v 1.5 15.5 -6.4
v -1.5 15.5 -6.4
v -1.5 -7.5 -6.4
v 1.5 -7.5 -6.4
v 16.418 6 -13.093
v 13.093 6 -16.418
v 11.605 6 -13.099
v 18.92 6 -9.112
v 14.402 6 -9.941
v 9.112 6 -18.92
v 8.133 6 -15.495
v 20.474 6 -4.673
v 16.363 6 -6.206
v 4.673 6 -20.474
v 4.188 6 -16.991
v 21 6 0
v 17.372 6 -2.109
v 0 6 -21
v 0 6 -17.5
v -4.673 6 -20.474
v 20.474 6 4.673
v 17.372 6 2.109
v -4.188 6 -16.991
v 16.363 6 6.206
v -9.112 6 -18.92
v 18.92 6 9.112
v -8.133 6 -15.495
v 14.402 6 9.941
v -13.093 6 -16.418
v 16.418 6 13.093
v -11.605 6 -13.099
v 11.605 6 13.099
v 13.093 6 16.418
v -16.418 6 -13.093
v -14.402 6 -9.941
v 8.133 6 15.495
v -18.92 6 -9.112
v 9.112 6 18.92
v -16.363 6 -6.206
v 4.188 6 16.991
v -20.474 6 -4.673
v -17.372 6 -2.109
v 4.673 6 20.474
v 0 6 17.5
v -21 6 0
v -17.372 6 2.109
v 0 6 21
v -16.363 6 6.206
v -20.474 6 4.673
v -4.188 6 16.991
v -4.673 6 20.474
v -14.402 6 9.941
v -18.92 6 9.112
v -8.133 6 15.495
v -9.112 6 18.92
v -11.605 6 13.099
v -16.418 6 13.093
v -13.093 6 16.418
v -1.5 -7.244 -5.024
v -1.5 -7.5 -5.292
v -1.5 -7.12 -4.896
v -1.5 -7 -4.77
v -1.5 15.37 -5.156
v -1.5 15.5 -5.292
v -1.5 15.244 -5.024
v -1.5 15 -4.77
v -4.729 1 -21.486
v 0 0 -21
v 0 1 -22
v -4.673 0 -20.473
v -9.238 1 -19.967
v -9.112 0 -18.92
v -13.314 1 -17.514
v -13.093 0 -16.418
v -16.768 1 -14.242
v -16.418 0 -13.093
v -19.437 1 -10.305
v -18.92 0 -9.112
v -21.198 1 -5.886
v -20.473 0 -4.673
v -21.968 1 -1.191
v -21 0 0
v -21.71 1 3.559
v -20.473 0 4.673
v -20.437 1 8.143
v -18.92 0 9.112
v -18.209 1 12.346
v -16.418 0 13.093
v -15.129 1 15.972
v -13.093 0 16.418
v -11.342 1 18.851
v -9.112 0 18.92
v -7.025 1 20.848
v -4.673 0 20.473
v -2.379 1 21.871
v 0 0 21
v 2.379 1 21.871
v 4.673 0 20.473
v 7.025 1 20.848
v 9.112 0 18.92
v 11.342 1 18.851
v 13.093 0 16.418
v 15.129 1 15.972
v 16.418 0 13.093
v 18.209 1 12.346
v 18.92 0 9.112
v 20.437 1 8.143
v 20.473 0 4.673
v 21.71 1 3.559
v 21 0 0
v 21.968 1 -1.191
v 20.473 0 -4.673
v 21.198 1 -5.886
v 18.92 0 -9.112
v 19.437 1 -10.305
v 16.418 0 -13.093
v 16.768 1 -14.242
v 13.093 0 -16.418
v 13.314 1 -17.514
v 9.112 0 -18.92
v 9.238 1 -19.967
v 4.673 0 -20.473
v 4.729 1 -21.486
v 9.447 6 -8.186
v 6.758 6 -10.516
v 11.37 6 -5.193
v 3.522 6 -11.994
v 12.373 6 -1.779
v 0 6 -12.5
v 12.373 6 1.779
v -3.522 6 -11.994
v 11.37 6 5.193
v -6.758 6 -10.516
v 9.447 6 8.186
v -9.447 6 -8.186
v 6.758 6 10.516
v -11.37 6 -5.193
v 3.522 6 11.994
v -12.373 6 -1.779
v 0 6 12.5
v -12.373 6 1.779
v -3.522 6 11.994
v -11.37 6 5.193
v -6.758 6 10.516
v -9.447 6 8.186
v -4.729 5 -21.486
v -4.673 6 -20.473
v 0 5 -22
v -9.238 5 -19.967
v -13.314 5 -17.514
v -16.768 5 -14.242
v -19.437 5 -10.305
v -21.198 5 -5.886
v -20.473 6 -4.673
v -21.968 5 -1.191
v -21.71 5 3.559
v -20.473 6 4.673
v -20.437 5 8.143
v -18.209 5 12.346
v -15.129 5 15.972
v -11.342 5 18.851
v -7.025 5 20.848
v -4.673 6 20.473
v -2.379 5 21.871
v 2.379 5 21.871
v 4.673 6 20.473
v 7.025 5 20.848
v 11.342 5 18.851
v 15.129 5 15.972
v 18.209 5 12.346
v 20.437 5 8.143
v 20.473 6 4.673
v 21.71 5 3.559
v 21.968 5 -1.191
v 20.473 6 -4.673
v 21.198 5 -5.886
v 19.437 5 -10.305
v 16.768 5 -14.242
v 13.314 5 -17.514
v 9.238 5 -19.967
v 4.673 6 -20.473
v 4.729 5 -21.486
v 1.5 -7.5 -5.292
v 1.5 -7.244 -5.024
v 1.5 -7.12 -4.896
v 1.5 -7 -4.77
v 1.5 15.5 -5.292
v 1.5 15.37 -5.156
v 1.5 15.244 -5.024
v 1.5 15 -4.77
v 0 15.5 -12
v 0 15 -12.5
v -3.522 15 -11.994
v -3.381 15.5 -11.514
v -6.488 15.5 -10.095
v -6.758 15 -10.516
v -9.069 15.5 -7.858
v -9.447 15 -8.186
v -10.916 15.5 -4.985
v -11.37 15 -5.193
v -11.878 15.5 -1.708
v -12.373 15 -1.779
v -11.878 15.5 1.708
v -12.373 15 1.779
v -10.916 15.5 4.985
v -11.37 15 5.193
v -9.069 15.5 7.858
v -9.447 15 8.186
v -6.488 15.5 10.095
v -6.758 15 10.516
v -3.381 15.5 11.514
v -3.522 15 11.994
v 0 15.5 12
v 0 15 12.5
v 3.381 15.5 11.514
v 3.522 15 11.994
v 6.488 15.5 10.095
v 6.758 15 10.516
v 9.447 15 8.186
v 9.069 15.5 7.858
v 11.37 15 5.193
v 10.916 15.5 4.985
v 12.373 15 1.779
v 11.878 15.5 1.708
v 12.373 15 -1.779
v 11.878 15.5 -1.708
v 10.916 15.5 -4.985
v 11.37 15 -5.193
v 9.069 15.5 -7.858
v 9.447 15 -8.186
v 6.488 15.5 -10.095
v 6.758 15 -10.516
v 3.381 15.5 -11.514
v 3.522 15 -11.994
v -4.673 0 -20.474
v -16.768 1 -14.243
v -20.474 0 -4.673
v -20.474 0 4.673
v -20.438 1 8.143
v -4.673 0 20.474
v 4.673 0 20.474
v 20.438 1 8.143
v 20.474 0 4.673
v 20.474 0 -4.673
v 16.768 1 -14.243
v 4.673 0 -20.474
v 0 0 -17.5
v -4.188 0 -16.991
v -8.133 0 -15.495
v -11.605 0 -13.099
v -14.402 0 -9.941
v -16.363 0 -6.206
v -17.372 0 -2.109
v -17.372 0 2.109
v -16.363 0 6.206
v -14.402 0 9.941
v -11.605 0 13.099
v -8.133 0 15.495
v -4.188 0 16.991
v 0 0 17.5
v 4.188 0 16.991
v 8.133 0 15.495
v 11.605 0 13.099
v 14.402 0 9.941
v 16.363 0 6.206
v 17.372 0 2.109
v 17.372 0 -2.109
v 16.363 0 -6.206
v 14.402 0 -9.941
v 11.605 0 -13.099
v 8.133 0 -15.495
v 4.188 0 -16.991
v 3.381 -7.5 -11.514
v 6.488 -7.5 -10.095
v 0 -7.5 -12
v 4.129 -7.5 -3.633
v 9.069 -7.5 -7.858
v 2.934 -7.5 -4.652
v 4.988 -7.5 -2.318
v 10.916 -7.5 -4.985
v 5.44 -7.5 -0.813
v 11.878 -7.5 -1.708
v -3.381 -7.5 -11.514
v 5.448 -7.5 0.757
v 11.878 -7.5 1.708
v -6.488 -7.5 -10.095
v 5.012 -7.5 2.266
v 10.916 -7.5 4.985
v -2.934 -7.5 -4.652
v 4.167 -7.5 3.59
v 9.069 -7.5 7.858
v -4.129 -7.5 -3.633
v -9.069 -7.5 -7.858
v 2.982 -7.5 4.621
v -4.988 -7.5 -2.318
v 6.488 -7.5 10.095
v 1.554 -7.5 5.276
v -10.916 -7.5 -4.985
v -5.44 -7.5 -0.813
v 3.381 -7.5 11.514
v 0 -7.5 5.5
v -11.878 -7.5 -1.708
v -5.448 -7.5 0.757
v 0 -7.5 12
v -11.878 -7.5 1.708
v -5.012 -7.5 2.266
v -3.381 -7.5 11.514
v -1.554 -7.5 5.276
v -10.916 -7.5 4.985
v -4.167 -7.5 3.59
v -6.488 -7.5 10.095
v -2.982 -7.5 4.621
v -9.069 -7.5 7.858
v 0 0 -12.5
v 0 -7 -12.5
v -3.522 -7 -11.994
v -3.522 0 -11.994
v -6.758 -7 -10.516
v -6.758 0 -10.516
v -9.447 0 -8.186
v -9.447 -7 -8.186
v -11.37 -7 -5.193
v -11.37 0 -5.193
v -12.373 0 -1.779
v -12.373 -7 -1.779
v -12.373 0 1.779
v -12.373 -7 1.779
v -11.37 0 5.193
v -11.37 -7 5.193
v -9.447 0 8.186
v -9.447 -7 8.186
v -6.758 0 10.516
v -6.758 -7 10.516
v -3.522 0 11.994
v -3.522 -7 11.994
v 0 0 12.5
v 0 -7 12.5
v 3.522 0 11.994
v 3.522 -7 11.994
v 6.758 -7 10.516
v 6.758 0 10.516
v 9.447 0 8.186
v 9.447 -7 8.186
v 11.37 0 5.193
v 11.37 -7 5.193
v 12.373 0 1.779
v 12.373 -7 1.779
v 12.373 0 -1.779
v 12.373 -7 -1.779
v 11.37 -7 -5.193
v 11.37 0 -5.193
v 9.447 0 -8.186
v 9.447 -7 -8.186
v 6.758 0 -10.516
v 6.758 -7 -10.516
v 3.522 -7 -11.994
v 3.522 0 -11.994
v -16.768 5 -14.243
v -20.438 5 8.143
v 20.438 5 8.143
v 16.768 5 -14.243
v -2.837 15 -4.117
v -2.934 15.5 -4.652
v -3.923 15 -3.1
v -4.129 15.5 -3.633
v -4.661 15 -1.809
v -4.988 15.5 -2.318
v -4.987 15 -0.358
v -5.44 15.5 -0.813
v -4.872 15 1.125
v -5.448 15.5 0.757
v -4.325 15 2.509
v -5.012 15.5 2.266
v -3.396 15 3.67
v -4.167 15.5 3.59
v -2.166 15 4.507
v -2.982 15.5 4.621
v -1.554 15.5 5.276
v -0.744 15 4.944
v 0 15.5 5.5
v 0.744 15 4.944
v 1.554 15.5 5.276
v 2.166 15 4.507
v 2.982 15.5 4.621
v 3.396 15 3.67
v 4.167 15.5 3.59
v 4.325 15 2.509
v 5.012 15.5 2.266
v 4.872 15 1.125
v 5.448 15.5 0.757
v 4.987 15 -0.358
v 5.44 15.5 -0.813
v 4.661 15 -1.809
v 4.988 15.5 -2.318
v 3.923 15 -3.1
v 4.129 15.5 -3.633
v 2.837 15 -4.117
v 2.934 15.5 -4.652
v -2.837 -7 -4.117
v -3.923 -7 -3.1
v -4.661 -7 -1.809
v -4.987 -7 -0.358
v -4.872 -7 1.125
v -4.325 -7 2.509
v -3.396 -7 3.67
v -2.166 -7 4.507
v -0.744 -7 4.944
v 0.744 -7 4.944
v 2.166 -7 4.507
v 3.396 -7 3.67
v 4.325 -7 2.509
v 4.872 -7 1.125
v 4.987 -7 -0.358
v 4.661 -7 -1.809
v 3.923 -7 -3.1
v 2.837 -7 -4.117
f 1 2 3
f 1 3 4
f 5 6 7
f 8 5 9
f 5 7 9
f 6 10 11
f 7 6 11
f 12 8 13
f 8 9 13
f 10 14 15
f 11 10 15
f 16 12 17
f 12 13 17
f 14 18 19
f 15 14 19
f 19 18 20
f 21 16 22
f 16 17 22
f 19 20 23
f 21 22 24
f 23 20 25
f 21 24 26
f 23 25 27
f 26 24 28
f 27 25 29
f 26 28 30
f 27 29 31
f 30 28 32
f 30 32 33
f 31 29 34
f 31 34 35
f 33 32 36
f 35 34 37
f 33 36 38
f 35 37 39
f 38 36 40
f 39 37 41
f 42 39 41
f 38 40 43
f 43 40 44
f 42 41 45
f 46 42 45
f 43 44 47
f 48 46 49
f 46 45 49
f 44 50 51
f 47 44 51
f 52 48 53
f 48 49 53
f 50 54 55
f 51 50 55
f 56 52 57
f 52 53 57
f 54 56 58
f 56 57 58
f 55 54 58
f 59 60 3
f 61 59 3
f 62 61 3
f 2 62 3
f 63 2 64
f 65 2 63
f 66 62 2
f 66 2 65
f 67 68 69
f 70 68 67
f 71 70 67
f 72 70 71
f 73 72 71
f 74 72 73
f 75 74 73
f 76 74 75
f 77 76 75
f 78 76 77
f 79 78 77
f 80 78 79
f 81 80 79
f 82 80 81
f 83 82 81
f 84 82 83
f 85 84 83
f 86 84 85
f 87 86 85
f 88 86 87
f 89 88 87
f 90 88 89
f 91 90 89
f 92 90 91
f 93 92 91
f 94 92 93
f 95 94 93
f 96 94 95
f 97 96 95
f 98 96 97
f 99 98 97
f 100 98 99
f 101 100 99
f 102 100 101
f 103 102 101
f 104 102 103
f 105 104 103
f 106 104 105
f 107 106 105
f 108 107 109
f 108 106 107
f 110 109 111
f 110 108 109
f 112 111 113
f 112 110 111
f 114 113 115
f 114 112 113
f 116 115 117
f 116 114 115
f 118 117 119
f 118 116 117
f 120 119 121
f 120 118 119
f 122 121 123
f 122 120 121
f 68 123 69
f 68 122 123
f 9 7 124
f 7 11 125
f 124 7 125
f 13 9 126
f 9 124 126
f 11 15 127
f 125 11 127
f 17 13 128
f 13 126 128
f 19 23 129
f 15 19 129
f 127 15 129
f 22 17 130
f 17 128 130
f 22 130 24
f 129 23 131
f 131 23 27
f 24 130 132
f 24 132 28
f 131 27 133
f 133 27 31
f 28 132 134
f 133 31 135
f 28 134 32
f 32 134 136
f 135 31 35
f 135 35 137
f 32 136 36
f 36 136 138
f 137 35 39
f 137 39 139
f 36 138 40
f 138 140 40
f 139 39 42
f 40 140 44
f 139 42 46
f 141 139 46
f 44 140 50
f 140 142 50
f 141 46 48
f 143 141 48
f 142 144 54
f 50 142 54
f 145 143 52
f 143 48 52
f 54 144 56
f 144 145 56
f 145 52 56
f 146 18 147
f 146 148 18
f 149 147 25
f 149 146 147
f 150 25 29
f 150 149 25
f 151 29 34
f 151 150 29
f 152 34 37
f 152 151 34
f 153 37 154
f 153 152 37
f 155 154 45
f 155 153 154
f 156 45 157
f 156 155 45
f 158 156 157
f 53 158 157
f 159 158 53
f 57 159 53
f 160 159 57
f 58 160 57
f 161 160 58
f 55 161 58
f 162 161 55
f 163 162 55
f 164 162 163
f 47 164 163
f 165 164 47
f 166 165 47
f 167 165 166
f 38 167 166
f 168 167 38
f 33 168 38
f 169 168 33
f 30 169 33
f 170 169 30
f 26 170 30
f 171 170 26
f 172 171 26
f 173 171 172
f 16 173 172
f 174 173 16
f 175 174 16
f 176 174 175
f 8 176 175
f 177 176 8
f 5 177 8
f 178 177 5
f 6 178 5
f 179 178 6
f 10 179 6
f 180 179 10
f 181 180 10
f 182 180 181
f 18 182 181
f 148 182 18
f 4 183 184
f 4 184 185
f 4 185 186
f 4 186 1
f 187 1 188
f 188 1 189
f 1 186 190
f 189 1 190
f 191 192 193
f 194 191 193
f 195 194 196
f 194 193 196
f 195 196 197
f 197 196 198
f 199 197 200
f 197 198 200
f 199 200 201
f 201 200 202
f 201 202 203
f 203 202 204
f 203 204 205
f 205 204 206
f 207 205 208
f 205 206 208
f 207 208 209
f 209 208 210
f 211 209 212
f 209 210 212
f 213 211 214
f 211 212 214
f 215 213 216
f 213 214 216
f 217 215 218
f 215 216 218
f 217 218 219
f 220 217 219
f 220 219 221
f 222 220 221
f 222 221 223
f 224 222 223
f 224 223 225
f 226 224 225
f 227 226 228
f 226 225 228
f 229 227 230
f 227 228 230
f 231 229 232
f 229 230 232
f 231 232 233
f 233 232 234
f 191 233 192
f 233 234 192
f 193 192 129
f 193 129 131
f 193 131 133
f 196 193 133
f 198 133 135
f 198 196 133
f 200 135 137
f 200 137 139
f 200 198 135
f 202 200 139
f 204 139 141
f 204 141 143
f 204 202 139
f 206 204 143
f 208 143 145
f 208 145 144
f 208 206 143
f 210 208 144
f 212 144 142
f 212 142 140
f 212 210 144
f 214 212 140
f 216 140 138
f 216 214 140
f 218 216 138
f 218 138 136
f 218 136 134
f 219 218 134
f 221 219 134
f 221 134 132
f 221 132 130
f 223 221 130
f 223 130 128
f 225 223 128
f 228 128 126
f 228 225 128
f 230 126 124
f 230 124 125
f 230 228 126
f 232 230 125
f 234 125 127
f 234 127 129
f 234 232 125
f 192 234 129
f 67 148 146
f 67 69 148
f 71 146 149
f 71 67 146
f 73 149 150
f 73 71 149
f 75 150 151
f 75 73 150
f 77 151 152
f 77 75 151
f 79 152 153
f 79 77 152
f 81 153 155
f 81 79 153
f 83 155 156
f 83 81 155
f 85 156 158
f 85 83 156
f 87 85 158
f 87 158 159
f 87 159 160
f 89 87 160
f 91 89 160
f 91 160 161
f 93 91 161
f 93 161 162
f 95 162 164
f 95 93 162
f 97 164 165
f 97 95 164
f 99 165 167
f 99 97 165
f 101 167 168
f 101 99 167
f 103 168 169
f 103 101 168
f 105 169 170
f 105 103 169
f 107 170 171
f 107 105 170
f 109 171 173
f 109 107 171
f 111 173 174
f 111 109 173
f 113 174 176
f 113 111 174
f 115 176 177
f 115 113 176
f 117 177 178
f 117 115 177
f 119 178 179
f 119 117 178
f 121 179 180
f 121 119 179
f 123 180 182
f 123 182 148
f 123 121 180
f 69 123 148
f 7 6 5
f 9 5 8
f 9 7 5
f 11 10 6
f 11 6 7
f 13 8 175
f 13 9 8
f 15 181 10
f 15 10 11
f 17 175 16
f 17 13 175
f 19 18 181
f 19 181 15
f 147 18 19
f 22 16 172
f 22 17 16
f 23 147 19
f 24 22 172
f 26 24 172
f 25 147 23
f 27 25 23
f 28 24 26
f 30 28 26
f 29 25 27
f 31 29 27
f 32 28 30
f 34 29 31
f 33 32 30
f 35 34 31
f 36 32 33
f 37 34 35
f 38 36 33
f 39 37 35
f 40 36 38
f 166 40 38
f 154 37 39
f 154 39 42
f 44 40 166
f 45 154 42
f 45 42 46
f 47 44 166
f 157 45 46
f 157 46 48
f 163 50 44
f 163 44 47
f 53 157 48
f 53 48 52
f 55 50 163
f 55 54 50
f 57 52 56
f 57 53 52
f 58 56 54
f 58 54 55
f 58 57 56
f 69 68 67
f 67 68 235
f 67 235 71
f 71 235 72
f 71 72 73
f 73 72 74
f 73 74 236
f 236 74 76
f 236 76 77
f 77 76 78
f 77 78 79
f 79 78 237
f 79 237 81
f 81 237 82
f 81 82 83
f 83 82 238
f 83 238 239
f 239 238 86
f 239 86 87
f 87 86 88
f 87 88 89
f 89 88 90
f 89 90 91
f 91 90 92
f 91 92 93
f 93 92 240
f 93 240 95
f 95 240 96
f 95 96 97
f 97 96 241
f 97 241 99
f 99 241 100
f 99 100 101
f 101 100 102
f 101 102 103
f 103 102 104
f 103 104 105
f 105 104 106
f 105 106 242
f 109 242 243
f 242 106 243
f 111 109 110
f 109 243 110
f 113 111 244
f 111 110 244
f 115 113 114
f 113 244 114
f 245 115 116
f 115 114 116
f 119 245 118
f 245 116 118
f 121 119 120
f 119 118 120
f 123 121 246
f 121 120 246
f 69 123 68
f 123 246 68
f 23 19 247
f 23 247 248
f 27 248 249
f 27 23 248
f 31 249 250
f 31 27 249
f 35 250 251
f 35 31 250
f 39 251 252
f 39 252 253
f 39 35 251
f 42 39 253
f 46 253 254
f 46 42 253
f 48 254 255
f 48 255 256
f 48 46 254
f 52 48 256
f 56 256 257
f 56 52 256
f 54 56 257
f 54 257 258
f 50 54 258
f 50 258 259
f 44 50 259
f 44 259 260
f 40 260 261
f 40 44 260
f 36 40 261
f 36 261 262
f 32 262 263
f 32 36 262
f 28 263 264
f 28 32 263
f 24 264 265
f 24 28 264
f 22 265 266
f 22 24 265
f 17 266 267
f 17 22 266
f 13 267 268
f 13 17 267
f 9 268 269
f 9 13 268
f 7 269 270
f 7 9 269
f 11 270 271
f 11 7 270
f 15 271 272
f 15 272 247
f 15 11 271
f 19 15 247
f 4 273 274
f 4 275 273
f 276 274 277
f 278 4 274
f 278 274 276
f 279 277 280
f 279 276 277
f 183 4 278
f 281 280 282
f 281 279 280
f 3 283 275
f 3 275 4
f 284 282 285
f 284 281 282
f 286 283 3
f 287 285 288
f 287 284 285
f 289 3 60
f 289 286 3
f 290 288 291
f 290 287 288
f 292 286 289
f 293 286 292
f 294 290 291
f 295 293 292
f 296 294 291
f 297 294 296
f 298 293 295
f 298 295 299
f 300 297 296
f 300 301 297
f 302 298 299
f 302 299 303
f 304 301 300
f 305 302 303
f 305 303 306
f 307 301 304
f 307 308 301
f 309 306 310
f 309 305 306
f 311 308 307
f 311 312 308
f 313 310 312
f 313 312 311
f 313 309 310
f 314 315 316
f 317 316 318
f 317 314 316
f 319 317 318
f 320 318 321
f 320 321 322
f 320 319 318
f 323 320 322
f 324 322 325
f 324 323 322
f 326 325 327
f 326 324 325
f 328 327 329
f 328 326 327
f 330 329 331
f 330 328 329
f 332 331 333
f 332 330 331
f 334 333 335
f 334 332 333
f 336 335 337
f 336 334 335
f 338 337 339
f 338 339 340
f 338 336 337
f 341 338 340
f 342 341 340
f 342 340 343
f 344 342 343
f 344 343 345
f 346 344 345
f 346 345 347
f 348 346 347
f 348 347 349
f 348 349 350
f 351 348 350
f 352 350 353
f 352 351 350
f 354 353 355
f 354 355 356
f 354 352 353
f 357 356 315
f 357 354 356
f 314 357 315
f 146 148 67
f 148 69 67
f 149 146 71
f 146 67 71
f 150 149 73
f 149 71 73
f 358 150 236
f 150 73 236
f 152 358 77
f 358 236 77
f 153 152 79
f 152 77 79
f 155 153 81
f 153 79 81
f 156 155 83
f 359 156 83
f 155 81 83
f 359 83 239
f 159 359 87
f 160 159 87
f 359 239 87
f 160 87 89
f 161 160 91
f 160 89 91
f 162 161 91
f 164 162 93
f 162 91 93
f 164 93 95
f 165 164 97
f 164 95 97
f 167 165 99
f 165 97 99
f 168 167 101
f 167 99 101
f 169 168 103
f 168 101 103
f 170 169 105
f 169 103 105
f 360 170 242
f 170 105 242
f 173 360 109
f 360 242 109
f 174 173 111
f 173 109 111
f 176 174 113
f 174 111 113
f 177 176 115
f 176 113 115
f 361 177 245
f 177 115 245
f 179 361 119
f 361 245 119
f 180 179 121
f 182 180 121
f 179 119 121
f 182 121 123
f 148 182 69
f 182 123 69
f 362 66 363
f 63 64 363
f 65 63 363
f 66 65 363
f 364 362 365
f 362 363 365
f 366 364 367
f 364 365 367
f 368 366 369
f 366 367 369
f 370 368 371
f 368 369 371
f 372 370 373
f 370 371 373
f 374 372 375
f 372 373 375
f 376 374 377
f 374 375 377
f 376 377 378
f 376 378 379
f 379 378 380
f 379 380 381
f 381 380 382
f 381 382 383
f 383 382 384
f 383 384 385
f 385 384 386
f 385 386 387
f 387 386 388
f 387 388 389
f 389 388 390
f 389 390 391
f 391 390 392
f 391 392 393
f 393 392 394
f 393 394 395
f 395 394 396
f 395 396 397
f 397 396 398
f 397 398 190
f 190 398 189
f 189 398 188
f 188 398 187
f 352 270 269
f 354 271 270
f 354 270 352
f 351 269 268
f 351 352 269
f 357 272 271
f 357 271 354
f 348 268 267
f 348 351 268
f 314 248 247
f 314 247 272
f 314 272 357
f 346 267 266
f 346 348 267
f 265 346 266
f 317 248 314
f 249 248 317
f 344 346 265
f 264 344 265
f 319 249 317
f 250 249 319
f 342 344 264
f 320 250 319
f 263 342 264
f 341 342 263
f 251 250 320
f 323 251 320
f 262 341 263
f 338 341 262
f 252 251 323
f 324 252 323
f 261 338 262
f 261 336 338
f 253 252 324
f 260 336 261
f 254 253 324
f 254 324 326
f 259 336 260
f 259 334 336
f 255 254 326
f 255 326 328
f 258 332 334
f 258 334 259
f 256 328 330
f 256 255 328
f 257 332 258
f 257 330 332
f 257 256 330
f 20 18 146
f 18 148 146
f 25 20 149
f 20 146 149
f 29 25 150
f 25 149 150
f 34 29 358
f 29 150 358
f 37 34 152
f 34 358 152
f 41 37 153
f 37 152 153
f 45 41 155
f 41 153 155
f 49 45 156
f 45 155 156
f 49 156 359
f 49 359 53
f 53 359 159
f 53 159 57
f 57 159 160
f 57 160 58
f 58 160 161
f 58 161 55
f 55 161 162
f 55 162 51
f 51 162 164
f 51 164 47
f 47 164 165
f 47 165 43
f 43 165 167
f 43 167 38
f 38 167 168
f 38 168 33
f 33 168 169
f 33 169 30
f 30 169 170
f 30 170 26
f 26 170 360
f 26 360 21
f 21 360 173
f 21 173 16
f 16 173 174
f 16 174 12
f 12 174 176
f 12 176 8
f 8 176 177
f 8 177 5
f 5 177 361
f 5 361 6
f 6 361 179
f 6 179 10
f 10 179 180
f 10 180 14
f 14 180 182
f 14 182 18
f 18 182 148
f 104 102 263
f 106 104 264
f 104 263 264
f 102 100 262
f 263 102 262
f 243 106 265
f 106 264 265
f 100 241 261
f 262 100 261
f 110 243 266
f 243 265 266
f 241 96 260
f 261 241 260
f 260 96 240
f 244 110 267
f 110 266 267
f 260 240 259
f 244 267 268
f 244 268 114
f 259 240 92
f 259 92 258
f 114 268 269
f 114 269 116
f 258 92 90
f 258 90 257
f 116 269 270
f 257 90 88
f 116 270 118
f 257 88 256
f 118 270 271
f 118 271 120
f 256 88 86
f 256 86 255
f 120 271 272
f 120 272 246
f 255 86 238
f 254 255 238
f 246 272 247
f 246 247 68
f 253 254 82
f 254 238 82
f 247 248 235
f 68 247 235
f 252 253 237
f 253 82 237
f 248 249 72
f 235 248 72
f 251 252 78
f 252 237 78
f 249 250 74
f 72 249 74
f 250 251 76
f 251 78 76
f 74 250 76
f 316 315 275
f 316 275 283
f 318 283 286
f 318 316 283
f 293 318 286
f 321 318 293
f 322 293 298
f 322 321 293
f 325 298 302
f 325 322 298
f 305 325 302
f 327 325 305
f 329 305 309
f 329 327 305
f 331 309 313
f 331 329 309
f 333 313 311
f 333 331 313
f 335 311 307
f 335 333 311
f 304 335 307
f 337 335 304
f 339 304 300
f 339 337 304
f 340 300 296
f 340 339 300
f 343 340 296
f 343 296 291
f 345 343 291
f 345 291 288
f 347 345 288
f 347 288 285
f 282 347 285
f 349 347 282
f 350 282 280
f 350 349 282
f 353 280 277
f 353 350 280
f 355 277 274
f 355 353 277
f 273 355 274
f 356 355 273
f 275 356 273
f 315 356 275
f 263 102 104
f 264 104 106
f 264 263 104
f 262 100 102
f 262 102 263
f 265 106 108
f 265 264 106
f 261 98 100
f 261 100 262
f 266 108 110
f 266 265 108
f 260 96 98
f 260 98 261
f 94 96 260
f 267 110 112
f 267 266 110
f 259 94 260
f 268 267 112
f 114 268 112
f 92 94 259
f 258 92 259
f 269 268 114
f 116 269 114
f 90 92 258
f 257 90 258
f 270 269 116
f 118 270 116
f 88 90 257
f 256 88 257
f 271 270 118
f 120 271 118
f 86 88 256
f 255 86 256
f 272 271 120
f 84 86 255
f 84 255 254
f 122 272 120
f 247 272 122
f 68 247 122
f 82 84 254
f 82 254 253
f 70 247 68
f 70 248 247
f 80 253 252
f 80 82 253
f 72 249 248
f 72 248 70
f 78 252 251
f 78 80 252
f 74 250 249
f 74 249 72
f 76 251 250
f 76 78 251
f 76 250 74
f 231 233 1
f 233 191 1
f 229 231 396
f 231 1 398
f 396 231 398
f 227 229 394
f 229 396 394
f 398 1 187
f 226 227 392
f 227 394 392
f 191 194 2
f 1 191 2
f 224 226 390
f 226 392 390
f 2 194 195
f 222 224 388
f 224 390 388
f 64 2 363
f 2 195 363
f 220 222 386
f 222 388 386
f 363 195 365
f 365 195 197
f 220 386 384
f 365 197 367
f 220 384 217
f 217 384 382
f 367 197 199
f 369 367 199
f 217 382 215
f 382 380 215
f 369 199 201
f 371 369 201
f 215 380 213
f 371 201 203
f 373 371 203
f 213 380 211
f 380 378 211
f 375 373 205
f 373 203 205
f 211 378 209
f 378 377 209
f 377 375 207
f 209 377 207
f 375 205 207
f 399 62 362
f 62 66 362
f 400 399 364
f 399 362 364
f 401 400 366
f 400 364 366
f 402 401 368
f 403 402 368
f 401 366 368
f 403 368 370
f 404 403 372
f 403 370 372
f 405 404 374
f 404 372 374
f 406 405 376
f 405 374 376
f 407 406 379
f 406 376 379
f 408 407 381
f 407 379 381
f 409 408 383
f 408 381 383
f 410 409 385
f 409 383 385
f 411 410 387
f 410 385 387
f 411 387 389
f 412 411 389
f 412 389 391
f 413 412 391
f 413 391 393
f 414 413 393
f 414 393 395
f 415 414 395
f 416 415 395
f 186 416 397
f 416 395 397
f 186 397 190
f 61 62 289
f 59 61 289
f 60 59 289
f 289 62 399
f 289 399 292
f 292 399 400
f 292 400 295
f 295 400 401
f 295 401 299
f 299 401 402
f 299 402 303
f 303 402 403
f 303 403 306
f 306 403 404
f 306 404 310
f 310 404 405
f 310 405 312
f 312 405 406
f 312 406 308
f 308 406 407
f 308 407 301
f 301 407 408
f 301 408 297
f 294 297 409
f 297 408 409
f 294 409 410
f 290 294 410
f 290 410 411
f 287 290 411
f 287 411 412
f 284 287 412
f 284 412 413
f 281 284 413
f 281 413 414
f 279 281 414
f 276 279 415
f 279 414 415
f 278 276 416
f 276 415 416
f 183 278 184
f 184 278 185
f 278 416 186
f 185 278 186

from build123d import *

# Parameters (mm, degrees)
SKETCH_5_W          = 12.5
SKETCH_5_H          = 23
SKETCH_10_R         = 5
CUT_EXTRUDE_3_DEPTH = 39.691197966
CHAMFER_3_SIZE      = 0.5
SKETCH_2_W          = 3
SKETCH_2_H          = 54.842712326
CUT_EXTRUDE_1_DEPTH = 6.4


with BuildPart() as part:
    # Эскиз1 → Revolve 729 (revolve)
    with BuildSketch(Plane.XY):
        Polygon((0, 6), (0, 0), (17.5, 0), (17.5, 6), (11, 6), align=None)
    revolve(axis=Axis((0, 0, 0), (0, 1, 0)))

    # Эскиз3 → Revolve 1176 (revolve)
    with BuildSketch(Plane.XY):
        Polygon((17.4999, -0.0001), (17.4999, 6.0001), (21.000041421, 6.0001), (22.0001, 5.000041421), (22.0001, 0.999958579), (21.000041421, -0.0001), align=None)
        Polygon((17.5, 0), (17.5, 6), (21, 6), (22, 5), (22, 1), (21, 0), align=None, mode=Mode.SUBTRACT)
    revolve(axis=Axis((0, 0, 0), (0, 1, 0)))

    # Эскиз5 → Revolve 2677 (revolve)
    with BuildSketch(Plane.XY):
        with Locations((6.25, 4)):
            Rectangle(SKETCH_5_W, SKETCH_5_H)
    revolve(axis=Axis((0, -50, 0), (0, 1, 0)))

    # Эскиз10 → Вырез-Вытянуть3 (cut, through all)
    with BuildSketch(Plane(origin=(0, 15.5, 0), x_dir=(1, 0, 0), z_dir=(0, 1, 0))):
        Circle(SKETCH_10_R)
    extrude(amount=-CUT_EXTRUDE_3_DEPTH, mode=Mode.SUBTRACT)

    # Фаска3
    chamfer_3_edges = [part.edges().sort_by_distance(p)[0] for p in [
        (-12.5, 15.5, 0),
        (-12.5, -7.5, 0),
        (-5, -7.5, 0),
        (-5, 15.5, 0),
    ]]
    chamfer(chamfer_3_edges, length=CHAMFER_3_SIZE)

    # Эскиз2 → Вырез-Вытянуть1 (cut)
    with BuildSketch(Plane.XY):
        Rectangle(SKETCH_2_W, SKETCH_2_H)
    extrude(amount=-CUT_EXTRUDE_1_DEPTH, mode=Mode.SUBTRACT)


solid = part.part
